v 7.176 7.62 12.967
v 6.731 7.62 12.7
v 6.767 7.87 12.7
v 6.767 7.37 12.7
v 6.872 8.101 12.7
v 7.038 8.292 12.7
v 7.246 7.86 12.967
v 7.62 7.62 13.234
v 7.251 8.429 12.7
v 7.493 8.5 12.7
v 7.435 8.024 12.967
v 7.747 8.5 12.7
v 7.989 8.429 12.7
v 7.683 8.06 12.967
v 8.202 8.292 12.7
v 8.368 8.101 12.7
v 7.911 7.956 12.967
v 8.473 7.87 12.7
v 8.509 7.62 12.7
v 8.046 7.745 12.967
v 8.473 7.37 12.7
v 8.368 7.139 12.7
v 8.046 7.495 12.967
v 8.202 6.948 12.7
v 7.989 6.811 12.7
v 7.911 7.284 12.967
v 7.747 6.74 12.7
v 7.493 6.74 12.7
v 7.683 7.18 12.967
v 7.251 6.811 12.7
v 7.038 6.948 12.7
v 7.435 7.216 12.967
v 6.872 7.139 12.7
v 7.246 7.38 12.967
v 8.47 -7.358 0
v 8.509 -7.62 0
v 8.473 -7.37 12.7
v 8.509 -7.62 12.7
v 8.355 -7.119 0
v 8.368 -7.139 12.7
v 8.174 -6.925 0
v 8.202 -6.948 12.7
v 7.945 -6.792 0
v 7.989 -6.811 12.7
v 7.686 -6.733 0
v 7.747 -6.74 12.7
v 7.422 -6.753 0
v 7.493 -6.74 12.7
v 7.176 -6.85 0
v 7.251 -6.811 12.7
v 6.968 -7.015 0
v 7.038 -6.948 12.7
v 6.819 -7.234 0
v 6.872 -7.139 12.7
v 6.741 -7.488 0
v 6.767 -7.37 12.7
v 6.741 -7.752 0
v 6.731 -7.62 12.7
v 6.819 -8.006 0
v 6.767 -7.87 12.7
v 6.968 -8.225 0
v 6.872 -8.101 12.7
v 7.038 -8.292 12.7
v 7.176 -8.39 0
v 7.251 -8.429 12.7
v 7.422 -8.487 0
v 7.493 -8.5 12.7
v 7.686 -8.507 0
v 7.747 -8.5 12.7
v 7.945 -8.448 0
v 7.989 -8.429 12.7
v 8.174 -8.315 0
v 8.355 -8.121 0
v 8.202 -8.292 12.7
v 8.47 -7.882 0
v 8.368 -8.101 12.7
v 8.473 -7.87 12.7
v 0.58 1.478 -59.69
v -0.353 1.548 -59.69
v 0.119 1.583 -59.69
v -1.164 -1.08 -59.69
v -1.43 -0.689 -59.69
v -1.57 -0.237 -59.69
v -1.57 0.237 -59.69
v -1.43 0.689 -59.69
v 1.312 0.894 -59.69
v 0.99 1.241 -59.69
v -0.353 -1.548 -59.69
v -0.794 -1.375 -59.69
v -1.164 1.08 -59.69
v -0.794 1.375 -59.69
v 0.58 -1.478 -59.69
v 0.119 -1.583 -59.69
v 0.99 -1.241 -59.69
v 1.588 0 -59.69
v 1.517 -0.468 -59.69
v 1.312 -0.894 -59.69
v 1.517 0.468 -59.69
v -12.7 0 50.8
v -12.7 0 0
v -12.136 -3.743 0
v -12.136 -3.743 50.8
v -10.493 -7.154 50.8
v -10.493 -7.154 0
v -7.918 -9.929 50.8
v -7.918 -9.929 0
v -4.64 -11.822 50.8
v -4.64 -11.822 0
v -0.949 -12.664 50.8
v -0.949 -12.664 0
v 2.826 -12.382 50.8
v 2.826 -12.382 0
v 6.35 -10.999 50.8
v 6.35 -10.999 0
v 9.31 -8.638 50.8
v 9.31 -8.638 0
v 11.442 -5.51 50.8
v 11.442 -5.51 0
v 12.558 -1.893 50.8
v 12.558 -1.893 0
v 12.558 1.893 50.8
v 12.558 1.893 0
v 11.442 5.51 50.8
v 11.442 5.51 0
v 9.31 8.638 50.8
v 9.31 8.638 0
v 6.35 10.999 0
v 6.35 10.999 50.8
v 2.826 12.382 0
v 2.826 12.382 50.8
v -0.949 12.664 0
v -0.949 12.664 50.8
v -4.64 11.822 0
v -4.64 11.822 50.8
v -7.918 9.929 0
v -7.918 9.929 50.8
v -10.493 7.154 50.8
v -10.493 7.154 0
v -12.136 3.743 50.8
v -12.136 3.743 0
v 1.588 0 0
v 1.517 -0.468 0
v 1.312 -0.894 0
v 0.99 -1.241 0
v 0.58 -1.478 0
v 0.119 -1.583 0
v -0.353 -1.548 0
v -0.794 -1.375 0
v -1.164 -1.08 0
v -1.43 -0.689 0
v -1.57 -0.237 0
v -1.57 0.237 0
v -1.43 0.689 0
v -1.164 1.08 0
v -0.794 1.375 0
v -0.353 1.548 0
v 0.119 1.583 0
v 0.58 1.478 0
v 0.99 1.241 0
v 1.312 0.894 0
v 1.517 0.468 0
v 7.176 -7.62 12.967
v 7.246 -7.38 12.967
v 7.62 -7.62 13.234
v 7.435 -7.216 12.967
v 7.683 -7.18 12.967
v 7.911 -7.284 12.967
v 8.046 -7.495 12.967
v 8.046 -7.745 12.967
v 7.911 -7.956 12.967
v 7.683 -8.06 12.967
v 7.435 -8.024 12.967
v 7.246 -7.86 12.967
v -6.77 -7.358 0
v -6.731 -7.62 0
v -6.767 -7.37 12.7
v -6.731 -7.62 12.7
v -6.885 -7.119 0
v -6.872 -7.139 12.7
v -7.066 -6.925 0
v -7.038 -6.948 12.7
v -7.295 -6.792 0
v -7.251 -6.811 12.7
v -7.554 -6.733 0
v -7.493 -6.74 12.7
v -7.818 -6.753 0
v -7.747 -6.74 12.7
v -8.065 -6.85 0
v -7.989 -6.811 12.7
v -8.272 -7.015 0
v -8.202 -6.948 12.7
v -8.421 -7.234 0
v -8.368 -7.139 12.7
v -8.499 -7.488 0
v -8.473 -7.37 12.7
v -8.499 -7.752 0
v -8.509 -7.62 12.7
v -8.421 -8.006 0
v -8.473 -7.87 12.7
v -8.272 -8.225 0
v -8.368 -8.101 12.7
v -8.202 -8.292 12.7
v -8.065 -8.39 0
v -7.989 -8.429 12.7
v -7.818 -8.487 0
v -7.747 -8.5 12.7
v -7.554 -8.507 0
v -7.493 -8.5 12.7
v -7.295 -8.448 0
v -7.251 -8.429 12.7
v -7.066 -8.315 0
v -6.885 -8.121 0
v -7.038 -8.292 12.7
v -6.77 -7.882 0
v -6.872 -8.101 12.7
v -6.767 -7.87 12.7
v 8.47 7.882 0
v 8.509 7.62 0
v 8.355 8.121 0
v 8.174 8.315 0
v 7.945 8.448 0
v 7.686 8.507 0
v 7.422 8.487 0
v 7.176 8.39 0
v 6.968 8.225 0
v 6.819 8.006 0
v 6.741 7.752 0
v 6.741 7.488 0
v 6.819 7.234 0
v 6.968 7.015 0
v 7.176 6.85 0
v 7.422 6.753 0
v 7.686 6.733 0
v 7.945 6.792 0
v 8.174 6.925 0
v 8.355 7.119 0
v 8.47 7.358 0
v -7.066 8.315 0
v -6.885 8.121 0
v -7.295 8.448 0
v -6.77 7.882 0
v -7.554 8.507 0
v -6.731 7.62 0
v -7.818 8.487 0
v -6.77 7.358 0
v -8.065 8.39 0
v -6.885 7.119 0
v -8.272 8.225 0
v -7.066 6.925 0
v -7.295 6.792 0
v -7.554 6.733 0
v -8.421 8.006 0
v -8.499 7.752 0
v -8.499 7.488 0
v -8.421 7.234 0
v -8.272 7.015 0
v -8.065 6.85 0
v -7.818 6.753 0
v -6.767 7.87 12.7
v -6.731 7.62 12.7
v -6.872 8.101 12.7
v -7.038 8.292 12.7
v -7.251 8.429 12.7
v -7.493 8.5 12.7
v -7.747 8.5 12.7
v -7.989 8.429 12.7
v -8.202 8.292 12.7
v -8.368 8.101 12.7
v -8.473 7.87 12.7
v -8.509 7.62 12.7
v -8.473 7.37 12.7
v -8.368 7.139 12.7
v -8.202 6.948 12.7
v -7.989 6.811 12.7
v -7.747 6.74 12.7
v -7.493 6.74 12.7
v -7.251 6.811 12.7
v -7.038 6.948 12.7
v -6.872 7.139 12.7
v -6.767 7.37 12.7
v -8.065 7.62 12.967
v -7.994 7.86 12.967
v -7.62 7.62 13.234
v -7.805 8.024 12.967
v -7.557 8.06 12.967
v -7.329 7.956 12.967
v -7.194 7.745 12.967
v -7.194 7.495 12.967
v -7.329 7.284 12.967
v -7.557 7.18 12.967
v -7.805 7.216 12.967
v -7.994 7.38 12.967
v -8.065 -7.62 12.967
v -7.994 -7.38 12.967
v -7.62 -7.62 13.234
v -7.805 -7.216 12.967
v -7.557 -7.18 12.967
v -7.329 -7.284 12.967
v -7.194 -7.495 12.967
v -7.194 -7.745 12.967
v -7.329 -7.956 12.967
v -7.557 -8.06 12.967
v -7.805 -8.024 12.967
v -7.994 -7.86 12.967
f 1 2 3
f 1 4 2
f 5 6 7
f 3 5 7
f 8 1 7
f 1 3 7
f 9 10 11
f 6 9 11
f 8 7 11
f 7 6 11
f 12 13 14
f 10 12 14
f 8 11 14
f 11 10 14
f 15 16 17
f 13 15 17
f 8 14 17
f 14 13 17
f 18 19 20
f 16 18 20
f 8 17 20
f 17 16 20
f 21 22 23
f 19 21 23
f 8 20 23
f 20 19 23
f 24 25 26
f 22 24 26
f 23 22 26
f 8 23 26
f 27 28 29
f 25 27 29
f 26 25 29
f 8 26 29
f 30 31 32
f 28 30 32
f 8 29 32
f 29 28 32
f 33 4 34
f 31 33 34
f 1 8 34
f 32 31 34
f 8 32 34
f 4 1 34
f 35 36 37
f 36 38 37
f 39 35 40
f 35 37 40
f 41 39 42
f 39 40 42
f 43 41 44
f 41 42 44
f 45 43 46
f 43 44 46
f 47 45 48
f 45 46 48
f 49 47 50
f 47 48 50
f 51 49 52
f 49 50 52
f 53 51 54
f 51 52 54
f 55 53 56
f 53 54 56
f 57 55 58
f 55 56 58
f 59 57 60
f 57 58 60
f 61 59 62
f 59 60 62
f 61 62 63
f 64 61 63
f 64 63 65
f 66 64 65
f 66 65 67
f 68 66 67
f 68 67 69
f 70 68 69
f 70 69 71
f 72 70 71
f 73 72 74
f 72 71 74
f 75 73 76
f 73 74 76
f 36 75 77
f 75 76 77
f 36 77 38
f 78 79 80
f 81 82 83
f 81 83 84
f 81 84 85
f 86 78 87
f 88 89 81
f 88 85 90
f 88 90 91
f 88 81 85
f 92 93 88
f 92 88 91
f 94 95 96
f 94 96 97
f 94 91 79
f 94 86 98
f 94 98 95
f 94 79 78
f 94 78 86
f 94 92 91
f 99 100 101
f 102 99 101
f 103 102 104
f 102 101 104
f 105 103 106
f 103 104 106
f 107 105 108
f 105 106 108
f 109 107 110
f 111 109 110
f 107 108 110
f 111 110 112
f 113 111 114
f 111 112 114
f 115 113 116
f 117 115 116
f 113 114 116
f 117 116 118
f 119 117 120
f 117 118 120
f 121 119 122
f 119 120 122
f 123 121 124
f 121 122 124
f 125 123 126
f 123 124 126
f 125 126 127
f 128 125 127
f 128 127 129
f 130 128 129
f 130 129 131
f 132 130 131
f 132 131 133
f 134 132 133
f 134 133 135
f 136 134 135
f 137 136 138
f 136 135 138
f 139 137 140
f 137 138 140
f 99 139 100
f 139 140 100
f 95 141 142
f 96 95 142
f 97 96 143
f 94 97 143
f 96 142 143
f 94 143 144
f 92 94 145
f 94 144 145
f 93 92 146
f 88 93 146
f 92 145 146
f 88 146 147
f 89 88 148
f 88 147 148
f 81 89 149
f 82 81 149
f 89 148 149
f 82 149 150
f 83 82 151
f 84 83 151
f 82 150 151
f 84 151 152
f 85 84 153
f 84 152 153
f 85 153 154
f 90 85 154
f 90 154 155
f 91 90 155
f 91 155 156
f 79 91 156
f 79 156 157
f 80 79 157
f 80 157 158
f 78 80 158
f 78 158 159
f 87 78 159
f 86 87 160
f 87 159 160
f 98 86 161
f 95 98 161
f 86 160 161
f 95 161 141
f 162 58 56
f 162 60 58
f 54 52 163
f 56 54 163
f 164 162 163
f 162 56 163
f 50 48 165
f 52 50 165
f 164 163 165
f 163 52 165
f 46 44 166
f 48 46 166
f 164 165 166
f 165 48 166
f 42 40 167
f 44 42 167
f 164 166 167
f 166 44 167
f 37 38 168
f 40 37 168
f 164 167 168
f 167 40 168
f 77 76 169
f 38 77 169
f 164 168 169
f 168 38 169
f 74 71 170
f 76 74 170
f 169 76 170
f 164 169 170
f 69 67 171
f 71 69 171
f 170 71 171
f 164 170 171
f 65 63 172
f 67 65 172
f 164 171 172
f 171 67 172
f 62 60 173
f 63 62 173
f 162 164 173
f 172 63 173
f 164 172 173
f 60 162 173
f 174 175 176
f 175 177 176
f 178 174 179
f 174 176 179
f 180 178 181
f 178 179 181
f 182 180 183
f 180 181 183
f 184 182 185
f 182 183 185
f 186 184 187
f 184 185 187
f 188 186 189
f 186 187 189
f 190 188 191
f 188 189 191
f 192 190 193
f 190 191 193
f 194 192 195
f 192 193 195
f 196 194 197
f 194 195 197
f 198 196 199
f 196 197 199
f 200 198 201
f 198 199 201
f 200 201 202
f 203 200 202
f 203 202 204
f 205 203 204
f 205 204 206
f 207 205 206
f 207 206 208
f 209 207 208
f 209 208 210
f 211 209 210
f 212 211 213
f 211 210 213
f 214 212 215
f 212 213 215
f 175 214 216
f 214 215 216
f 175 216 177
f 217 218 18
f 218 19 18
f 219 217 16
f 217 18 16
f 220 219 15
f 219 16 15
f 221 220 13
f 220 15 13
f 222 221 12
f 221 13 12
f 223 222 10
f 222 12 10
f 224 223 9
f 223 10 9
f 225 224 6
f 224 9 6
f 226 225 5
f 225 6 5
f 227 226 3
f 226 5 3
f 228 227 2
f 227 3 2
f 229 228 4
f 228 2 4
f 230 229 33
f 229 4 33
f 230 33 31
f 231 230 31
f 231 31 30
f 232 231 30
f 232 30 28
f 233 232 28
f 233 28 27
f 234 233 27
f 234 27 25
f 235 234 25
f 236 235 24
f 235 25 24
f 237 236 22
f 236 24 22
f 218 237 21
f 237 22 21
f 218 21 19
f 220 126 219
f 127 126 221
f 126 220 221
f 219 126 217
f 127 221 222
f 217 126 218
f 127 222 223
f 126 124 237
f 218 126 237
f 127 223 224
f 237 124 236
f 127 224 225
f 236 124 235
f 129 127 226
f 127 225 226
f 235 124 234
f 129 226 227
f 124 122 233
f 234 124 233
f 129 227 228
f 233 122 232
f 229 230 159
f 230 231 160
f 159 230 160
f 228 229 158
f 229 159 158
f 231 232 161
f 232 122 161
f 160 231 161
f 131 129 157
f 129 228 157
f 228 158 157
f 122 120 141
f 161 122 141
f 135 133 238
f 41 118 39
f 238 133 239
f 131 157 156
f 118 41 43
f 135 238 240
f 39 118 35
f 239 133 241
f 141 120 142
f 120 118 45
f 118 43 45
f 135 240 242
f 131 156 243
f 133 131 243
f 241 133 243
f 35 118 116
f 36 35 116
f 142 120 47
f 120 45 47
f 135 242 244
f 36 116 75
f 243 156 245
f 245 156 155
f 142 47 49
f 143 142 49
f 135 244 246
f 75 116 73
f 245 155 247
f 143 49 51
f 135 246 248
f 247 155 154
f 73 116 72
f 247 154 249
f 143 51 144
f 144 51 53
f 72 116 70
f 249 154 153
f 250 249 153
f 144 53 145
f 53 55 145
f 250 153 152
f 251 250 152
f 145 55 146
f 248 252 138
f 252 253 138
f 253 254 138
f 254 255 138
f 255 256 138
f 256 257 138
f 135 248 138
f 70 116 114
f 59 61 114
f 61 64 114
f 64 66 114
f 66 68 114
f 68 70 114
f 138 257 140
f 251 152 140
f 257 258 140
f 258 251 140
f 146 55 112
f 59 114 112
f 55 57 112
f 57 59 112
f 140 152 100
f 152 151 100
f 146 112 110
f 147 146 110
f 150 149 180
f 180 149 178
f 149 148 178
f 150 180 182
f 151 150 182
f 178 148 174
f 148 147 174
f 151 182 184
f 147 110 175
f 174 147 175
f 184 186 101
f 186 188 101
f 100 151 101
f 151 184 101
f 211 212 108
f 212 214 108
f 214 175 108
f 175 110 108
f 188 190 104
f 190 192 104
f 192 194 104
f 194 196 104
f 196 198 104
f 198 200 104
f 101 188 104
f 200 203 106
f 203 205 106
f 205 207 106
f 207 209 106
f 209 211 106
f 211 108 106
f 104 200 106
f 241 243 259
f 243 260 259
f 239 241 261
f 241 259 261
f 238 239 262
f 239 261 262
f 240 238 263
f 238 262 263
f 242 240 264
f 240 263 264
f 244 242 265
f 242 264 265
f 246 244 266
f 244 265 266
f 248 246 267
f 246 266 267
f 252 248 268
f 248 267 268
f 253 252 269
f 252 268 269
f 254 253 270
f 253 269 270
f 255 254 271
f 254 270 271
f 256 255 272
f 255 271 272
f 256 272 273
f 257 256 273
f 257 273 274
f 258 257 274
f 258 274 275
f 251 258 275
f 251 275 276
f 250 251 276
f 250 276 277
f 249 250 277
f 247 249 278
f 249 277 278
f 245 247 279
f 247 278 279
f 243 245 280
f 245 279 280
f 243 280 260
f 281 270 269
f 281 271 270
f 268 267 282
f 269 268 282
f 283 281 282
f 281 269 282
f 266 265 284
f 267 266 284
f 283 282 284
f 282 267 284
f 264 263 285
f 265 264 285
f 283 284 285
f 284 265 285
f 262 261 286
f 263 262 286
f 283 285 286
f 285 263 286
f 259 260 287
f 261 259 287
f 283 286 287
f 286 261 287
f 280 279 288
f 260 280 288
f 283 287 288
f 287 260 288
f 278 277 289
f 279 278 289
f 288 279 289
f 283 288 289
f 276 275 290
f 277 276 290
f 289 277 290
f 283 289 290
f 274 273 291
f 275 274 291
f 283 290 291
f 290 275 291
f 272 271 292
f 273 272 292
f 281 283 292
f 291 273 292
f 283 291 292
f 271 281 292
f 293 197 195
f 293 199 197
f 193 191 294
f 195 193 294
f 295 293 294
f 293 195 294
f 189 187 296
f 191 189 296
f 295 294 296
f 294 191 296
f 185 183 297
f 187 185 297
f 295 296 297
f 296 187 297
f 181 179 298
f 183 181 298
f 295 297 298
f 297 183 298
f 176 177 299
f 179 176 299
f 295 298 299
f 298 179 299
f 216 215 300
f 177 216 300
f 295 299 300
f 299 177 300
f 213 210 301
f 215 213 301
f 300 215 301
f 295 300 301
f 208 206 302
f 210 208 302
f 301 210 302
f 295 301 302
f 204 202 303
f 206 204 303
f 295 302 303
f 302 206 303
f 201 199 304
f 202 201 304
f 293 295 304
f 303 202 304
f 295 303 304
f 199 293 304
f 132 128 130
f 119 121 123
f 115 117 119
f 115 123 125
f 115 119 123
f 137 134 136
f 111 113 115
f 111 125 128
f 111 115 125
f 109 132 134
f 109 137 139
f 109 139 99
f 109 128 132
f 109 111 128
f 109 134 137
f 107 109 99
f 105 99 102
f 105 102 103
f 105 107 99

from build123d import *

# Parameters (mm, degrees)
SKETCH1_R                 = 12.7
BOSS_EXTRUDE1_DEPTH       = 50.8
SKETCH2_R                 = 1.5875
BOSS_EXTRUDE2_DEPTH       = 59.69
F_2_64_TAPPED_HOLE1_D     = 1.778
F_2_64_TAPPED_HOLE1_DEPTH = 12.7
F_2_64_TAPPED_HOLE1_TIP   = 0.53416509


with BuildPart() as part:
    # Sketch1 → Boss-Extrude1 (new body)
    with BuildSketch(Plane.XY):
        with Locations(Location((0, 0, 0), (0, 0, 180))):
            Circle(SKETCH1_R)
    extrude(amount=BOSS_EXTRUDE1_DEPTH)

    # Sketch2 → Boss-Extrude2 (add)
    with BuildSketch(Plane(origin=(0, 0, 0), x_dir=(-1, 0, 0), z_dir=(0, 0, -1))):
        with Locations(Location((0, 0, 0), (0, 0, 180))):
            Circle(SKETCH2_R)
    extrude(amount=BOSS_EXTRUDE2_DEPTH)

    # #2-64 Tapped Hole1
    with Locations(Plane(origin=(0, 0, 0), x_dir=(-1, 0, 0), z_dir=(0, 0, -1))):
        with Locations((-7.62, 7.62), (7.62, 7.62), (7.62, -7.62), (-7.62, -7.62)):
            Hole(F_2_64_TAPPED_HOLE1_D / 2, depth=F_2_64_TAPPED_HOLE1_DEPTH)
            with Locations((0, 0, -(F_2_64_TAPPED_HOLE1_DEPTH + F_2_64_TAPPED_HOLE1_TIP / 2))):  # 118° drill point
                Cone(0, F_2_64_TAPPED_HOLE1_D / 2, F_2_64_TAPPED_HOLE1_TIP, mode=Mode.SUBTRACT)


solid = part.part
